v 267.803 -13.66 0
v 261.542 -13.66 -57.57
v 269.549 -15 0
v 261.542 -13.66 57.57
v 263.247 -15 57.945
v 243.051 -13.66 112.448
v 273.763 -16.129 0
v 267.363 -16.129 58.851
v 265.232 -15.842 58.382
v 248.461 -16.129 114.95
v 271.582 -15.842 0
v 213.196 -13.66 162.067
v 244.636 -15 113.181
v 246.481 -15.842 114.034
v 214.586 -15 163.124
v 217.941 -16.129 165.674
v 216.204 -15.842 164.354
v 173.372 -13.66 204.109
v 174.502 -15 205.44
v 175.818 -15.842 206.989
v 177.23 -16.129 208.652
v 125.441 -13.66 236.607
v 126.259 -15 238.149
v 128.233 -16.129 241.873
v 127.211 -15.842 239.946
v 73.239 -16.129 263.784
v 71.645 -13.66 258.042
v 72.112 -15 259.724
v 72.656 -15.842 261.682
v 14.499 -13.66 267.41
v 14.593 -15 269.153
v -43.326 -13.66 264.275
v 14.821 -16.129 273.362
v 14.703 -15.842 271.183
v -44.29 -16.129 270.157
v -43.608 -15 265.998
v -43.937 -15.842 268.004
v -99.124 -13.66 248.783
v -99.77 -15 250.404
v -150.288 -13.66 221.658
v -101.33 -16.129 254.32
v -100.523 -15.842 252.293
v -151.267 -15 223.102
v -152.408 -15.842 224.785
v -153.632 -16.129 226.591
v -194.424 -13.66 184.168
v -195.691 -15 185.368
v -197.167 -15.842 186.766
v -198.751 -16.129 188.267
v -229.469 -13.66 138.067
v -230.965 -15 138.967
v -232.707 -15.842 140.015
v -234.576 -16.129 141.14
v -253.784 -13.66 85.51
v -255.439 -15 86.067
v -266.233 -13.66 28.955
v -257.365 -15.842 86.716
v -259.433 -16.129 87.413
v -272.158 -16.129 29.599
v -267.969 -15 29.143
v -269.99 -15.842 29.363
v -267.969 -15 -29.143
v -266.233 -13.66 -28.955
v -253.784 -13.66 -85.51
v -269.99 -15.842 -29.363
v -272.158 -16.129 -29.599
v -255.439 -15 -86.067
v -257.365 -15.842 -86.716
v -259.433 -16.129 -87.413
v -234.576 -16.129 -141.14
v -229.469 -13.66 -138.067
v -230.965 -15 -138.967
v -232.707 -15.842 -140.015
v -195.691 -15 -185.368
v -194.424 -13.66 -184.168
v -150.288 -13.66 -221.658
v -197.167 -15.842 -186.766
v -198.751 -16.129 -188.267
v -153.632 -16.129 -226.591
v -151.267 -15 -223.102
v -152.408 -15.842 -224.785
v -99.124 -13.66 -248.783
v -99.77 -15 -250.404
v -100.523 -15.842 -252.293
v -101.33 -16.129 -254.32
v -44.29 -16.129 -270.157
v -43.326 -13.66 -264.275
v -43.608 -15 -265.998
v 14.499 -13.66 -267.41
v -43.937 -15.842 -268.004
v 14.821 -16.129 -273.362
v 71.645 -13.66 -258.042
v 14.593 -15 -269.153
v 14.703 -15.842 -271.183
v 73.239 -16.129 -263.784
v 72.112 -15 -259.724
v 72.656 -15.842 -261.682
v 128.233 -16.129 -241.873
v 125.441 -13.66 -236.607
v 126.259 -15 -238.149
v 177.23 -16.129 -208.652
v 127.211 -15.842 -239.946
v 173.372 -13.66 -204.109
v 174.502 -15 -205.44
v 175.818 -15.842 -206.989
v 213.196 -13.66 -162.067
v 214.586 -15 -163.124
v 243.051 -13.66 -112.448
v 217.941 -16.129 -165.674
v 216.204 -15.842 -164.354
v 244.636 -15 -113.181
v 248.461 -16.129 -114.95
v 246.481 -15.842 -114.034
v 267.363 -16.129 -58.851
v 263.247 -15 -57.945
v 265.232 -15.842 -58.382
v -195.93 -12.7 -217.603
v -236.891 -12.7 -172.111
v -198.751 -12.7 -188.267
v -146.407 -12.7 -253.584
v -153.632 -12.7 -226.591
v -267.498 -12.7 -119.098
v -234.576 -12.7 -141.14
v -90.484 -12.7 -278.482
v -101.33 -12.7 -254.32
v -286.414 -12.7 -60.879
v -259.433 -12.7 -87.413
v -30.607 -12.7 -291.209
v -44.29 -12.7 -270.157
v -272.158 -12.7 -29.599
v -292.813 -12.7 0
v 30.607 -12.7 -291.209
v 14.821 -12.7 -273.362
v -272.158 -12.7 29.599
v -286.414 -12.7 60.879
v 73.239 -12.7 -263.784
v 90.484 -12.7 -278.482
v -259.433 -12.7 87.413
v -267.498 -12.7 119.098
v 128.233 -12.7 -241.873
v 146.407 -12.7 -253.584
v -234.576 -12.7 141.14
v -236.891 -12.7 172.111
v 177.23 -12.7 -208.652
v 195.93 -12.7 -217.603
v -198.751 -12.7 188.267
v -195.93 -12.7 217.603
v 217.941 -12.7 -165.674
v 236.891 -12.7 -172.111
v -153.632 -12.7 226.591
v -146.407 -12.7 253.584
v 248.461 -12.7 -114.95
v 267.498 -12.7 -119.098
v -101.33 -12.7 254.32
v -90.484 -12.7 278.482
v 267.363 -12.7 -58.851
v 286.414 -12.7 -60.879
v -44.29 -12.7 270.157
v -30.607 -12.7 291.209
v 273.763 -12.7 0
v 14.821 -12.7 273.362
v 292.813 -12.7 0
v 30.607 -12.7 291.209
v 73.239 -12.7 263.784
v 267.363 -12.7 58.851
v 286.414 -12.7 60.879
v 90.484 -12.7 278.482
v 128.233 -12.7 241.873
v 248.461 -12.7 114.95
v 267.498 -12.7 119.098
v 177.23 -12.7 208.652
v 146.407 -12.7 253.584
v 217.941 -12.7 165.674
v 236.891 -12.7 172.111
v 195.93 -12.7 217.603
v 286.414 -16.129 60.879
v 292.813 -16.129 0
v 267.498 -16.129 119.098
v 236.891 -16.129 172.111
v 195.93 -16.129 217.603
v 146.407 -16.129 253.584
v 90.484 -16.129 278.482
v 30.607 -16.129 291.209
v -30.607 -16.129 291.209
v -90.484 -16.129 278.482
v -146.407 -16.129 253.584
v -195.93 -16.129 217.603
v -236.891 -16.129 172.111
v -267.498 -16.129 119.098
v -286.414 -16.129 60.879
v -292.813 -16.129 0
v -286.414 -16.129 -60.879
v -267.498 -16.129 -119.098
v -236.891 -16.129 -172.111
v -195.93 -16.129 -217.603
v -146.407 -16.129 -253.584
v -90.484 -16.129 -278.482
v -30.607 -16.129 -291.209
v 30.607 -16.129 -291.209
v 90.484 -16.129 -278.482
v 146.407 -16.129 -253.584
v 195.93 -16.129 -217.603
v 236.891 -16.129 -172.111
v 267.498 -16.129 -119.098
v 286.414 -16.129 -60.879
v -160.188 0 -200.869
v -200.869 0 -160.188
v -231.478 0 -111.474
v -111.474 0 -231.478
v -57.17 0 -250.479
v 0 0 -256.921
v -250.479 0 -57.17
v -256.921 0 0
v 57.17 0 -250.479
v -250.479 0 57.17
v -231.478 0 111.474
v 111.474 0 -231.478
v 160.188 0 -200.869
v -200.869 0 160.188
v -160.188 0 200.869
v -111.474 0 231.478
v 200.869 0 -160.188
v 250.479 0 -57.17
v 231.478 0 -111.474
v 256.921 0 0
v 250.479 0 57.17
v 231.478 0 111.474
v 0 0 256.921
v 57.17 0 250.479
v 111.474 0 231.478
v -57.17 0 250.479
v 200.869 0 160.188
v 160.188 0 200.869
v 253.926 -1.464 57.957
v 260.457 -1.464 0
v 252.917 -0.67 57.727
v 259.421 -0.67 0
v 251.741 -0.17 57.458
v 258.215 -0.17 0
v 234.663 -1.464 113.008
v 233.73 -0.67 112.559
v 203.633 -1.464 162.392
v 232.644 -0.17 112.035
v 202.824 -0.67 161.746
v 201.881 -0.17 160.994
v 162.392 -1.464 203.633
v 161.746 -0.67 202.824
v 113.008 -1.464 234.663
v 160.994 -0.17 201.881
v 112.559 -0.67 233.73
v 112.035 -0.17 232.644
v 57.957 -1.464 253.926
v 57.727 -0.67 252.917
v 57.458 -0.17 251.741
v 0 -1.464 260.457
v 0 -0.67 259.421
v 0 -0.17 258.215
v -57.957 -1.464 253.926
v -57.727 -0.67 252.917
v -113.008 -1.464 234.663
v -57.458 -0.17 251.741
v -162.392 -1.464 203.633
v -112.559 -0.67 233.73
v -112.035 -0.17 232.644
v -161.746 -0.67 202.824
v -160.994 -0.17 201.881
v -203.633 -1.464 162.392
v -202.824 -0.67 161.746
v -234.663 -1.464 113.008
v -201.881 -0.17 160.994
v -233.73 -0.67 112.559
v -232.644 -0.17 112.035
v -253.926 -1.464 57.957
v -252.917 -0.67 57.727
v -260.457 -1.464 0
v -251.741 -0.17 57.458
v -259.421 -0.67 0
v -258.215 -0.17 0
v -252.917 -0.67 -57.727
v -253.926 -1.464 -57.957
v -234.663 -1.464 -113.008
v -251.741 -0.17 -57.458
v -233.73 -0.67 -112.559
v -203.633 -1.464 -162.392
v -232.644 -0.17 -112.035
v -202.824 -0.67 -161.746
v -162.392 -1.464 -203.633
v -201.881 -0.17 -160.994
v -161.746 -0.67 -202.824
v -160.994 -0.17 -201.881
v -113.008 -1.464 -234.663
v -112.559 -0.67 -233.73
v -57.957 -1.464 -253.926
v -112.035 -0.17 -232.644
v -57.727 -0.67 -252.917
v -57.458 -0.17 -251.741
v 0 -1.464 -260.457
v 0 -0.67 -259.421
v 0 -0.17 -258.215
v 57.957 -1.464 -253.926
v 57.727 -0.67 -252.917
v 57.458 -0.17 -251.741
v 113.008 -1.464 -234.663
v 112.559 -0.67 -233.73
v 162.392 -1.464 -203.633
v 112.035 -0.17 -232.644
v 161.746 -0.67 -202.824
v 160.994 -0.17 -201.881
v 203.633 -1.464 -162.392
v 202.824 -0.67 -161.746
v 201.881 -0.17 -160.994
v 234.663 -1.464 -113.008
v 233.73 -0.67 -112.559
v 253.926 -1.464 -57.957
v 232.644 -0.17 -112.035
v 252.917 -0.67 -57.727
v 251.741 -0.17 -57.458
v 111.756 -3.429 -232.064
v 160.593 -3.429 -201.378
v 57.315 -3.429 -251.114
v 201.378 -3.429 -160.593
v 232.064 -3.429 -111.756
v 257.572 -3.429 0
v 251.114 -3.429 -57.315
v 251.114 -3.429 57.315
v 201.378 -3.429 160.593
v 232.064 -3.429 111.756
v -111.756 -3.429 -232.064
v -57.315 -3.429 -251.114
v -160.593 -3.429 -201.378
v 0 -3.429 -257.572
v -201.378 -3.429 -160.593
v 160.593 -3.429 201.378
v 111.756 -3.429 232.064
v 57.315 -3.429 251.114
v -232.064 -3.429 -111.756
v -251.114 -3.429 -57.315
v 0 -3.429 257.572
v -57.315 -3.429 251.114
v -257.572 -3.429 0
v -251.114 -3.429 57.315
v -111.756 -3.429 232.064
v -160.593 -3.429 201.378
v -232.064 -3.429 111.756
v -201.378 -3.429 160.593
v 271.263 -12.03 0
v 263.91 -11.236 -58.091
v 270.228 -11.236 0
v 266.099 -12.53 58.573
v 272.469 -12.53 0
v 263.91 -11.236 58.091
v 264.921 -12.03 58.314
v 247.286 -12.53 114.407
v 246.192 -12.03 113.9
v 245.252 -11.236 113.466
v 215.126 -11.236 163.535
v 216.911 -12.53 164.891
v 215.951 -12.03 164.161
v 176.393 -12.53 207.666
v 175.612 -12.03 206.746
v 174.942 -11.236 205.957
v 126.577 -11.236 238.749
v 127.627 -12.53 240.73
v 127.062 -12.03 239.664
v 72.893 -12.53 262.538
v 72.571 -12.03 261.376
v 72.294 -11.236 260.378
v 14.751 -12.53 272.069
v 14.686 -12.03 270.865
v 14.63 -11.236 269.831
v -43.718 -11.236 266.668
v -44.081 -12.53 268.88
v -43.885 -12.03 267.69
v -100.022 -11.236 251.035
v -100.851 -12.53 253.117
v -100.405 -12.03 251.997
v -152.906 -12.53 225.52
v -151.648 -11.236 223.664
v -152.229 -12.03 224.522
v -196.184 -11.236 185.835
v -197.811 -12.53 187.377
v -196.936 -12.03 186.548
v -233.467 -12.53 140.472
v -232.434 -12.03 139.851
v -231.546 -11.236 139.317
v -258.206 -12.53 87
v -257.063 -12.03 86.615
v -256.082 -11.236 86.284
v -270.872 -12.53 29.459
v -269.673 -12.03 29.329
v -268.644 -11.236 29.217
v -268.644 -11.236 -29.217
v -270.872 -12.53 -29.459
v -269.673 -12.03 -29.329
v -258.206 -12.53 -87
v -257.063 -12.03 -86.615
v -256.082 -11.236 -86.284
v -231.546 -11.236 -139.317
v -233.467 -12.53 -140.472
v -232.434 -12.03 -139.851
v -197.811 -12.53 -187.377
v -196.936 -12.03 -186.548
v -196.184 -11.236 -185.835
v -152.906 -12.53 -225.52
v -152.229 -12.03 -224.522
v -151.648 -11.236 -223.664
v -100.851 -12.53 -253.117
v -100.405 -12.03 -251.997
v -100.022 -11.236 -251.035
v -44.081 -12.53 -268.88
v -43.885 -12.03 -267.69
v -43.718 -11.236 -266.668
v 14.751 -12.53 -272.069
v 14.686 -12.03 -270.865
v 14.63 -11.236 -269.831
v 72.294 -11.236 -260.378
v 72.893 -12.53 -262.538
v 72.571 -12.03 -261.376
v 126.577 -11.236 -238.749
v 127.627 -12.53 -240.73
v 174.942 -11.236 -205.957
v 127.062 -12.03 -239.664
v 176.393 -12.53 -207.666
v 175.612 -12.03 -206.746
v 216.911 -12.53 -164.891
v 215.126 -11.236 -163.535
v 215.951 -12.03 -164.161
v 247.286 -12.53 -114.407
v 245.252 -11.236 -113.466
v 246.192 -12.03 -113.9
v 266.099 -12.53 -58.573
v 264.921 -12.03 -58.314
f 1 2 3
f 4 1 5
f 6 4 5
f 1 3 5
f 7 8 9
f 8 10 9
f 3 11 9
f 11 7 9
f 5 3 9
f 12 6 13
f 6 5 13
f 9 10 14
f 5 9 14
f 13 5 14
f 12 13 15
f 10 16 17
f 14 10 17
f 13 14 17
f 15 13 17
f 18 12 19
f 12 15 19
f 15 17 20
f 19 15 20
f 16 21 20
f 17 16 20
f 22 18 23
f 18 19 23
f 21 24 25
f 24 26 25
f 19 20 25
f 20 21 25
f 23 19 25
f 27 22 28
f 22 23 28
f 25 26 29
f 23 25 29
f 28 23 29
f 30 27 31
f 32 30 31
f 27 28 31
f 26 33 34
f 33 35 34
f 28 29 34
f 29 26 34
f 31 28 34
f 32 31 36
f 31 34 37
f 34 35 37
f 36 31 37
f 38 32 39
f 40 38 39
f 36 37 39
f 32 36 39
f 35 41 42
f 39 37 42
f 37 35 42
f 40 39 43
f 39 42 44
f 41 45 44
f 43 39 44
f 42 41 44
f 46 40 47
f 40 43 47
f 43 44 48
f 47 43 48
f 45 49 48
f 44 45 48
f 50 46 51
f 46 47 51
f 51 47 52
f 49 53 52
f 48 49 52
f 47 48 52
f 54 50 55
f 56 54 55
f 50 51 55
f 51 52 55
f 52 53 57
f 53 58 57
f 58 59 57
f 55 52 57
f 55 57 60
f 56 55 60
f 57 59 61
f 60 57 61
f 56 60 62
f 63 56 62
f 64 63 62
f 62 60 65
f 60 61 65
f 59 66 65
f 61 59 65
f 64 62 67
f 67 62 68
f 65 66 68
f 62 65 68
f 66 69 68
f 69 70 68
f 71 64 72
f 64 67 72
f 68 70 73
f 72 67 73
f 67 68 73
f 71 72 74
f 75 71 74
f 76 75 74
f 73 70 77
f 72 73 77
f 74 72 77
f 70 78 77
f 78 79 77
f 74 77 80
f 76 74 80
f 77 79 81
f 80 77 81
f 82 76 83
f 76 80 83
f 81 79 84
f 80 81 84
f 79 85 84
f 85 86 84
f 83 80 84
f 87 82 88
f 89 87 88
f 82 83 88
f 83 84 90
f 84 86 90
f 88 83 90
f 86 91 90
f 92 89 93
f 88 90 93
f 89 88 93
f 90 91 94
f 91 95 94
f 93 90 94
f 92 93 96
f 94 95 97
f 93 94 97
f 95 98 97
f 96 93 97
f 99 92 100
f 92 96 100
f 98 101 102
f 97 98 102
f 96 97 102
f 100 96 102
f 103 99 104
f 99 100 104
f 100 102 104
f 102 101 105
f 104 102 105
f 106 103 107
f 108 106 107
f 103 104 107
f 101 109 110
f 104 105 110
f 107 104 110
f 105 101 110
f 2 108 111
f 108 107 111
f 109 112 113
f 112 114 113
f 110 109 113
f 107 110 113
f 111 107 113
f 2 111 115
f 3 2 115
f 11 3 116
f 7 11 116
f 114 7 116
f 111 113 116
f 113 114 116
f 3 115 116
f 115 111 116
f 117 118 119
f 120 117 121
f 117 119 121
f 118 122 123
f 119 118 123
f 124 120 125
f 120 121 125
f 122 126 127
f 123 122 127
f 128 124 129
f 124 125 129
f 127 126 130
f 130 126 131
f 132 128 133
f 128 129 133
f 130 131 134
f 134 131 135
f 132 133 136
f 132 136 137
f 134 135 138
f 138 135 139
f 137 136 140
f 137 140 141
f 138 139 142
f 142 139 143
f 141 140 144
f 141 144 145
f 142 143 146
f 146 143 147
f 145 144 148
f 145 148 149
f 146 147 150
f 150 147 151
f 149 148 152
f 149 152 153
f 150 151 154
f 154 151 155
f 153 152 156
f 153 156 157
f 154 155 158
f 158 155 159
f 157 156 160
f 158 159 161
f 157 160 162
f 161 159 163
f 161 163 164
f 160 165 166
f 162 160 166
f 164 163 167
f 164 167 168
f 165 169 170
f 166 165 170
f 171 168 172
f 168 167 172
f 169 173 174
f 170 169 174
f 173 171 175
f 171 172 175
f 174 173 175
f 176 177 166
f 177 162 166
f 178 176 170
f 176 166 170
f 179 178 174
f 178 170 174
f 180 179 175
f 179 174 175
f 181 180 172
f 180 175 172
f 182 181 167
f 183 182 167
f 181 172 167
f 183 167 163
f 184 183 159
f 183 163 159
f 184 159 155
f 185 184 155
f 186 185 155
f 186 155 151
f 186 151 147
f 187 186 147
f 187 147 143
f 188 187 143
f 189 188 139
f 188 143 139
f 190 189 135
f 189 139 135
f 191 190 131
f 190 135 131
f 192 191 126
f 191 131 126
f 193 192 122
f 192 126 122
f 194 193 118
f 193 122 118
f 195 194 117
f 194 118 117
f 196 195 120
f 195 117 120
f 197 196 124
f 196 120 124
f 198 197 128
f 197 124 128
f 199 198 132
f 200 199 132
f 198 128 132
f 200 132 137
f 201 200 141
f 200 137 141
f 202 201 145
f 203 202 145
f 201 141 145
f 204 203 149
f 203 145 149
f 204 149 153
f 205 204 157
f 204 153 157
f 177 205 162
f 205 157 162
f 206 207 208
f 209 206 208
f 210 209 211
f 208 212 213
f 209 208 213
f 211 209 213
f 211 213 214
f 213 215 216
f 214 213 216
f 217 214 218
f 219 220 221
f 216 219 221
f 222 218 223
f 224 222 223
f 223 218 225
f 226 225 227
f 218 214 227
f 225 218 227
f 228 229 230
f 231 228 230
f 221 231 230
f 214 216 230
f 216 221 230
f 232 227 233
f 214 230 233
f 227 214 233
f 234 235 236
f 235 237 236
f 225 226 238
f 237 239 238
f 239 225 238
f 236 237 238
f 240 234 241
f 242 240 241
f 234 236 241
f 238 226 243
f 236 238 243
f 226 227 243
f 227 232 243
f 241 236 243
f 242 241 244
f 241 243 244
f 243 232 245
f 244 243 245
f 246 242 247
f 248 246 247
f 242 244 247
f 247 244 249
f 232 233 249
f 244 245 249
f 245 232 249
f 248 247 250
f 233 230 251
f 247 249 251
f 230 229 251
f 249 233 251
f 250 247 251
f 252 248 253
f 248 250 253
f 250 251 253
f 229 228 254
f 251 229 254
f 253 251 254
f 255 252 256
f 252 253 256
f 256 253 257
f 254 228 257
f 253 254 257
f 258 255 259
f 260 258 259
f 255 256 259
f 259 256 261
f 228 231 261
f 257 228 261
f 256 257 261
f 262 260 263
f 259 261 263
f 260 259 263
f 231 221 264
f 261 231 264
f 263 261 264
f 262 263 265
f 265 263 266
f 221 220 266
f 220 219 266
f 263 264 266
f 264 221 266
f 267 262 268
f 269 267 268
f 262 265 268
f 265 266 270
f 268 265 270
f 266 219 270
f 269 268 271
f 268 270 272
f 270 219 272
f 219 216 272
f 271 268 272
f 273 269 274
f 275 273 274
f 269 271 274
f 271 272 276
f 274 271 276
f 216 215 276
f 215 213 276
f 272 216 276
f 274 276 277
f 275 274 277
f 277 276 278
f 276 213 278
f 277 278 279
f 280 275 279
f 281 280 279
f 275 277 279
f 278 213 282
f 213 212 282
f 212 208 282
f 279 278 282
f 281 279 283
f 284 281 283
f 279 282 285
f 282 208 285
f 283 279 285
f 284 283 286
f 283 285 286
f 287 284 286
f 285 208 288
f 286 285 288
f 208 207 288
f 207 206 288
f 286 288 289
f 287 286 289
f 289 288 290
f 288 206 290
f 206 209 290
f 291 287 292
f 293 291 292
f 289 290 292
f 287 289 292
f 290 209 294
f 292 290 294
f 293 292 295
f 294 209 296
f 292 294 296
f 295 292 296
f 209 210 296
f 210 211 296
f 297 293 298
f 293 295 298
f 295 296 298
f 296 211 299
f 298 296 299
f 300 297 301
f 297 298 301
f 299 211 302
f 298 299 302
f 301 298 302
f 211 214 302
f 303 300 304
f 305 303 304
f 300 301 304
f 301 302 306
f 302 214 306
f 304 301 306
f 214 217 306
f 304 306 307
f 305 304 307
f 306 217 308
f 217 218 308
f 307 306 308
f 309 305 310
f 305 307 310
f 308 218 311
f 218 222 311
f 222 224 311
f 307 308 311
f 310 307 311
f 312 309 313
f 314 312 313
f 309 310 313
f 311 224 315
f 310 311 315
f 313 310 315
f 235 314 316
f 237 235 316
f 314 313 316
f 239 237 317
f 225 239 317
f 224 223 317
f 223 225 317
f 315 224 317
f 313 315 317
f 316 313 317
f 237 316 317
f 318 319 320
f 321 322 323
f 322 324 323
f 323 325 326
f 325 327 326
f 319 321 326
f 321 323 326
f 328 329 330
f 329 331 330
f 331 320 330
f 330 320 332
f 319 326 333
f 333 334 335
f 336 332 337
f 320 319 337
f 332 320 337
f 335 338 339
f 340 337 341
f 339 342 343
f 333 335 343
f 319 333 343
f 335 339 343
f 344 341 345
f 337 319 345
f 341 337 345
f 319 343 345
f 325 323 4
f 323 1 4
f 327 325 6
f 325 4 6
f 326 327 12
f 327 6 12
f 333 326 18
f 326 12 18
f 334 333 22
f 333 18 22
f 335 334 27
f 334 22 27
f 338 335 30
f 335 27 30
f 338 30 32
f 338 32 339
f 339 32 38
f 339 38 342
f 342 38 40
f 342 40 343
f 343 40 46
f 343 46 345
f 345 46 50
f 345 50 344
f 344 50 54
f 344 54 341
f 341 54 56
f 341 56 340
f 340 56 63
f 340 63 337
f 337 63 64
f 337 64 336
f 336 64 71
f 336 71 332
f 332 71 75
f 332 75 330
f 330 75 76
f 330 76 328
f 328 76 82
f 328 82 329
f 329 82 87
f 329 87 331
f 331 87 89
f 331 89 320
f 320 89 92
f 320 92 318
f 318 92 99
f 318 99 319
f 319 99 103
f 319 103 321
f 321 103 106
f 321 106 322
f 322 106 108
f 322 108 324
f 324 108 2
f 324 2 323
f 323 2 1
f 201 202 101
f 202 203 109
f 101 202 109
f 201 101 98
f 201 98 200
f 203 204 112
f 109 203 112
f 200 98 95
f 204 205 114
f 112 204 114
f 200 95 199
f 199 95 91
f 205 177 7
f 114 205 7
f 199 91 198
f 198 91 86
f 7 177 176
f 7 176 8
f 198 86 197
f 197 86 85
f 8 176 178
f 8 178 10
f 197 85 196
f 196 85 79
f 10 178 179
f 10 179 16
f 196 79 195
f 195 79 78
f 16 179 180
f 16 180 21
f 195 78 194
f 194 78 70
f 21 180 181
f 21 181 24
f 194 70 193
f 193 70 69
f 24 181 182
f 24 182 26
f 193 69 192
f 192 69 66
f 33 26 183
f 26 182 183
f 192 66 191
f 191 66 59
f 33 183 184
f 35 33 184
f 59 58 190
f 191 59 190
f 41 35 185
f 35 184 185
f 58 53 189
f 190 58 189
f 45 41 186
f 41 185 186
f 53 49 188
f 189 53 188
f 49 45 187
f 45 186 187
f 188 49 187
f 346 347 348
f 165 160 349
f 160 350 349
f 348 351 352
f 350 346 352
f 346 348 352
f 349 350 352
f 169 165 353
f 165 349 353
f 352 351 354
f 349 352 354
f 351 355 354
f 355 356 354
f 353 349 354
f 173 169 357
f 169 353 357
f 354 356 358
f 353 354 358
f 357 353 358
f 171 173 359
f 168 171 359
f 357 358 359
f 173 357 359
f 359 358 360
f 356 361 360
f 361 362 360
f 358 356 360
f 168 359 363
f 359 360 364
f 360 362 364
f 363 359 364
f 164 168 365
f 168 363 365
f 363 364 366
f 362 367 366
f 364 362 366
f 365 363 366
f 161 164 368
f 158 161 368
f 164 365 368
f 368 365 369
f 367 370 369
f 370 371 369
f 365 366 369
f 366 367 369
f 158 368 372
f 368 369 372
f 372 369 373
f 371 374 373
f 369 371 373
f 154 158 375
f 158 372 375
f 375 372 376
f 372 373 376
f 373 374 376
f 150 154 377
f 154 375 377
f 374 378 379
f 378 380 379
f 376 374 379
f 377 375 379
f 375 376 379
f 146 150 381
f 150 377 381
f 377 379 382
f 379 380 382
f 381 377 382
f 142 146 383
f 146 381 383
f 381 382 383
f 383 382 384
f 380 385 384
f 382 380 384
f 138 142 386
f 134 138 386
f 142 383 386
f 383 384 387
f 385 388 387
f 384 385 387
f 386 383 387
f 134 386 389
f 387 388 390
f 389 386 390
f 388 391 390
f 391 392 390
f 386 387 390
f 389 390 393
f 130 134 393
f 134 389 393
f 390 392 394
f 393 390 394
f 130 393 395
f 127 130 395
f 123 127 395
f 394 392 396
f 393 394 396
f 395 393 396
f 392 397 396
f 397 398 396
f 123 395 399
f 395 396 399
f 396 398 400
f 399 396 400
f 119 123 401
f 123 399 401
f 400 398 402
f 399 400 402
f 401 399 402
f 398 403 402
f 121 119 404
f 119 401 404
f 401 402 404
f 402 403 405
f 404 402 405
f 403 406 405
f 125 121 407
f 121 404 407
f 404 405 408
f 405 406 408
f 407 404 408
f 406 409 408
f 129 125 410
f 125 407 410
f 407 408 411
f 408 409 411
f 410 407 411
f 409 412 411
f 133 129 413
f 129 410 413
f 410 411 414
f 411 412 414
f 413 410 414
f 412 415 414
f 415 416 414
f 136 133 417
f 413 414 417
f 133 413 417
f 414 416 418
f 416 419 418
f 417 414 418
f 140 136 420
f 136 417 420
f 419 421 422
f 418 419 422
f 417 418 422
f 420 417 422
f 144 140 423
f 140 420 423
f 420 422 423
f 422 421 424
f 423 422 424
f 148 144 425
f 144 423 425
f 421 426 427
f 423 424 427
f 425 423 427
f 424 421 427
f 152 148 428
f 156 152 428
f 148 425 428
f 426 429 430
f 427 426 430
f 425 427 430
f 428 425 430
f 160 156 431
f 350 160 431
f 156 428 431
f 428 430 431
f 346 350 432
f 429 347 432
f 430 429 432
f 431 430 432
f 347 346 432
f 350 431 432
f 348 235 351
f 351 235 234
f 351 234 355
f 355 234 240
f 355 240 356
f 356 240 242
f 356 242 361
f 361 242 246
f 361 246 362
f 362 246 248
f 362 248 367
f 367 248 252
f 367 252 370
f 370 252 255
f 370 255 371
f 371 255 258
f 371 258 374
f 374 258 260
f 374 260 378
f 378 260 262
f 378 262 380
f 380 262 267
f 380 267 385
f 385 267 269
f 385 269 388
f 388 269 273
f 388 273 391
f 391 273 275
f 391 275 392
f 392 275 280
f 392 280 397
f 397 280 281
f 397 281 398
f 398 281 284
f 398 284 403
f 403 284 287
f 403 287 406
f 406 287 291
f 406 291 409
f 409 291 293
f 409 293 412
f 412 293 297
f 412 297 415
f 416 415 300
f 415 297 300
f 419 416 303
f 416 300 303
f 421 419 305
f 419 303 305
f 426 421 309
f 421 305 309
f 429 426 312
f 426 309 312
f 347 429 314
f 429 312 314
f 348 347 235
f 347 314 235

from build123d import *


with BuildPart() as f1:
    # F0 (on Top) → F1 (revolve)
    with BuildSketch(Plane.XY):
        with BuildLine():
            Line((256.921, 0), (0, 0))
            Line((0, 0), (0, -3.429))
            Line((0, -3.429), (257.57173, -3.429))
            Line((257.57173, -3.429), (267.802933, -13.660203))
            ThreePointArc((267.802933, -13.660203), (270.537497, -15.487381), (273.763136, -16.129))
            Line((273.763136, -16.129), (292.813136, -16.129))
            Line((292.813136, -16.129), (292.813136, -12.7))
            Line((292.813136, -12.7), (273.763136, -12.7))
            ThreePointArc((273.763136, -12.7), (271.849718, -12.319398), (270.227602, -11.235534))
            Line((270.227602, -11.235534), (260.456534, -1.464466))
            ThreePointArc((260.456534, -1.464466), (258.834417, -0.380602), (256.921, 0))
        make_face()
    revolve(axis=Axis((0, -1.7145, 0), (0, -1, 0)))


solid = f1.part
